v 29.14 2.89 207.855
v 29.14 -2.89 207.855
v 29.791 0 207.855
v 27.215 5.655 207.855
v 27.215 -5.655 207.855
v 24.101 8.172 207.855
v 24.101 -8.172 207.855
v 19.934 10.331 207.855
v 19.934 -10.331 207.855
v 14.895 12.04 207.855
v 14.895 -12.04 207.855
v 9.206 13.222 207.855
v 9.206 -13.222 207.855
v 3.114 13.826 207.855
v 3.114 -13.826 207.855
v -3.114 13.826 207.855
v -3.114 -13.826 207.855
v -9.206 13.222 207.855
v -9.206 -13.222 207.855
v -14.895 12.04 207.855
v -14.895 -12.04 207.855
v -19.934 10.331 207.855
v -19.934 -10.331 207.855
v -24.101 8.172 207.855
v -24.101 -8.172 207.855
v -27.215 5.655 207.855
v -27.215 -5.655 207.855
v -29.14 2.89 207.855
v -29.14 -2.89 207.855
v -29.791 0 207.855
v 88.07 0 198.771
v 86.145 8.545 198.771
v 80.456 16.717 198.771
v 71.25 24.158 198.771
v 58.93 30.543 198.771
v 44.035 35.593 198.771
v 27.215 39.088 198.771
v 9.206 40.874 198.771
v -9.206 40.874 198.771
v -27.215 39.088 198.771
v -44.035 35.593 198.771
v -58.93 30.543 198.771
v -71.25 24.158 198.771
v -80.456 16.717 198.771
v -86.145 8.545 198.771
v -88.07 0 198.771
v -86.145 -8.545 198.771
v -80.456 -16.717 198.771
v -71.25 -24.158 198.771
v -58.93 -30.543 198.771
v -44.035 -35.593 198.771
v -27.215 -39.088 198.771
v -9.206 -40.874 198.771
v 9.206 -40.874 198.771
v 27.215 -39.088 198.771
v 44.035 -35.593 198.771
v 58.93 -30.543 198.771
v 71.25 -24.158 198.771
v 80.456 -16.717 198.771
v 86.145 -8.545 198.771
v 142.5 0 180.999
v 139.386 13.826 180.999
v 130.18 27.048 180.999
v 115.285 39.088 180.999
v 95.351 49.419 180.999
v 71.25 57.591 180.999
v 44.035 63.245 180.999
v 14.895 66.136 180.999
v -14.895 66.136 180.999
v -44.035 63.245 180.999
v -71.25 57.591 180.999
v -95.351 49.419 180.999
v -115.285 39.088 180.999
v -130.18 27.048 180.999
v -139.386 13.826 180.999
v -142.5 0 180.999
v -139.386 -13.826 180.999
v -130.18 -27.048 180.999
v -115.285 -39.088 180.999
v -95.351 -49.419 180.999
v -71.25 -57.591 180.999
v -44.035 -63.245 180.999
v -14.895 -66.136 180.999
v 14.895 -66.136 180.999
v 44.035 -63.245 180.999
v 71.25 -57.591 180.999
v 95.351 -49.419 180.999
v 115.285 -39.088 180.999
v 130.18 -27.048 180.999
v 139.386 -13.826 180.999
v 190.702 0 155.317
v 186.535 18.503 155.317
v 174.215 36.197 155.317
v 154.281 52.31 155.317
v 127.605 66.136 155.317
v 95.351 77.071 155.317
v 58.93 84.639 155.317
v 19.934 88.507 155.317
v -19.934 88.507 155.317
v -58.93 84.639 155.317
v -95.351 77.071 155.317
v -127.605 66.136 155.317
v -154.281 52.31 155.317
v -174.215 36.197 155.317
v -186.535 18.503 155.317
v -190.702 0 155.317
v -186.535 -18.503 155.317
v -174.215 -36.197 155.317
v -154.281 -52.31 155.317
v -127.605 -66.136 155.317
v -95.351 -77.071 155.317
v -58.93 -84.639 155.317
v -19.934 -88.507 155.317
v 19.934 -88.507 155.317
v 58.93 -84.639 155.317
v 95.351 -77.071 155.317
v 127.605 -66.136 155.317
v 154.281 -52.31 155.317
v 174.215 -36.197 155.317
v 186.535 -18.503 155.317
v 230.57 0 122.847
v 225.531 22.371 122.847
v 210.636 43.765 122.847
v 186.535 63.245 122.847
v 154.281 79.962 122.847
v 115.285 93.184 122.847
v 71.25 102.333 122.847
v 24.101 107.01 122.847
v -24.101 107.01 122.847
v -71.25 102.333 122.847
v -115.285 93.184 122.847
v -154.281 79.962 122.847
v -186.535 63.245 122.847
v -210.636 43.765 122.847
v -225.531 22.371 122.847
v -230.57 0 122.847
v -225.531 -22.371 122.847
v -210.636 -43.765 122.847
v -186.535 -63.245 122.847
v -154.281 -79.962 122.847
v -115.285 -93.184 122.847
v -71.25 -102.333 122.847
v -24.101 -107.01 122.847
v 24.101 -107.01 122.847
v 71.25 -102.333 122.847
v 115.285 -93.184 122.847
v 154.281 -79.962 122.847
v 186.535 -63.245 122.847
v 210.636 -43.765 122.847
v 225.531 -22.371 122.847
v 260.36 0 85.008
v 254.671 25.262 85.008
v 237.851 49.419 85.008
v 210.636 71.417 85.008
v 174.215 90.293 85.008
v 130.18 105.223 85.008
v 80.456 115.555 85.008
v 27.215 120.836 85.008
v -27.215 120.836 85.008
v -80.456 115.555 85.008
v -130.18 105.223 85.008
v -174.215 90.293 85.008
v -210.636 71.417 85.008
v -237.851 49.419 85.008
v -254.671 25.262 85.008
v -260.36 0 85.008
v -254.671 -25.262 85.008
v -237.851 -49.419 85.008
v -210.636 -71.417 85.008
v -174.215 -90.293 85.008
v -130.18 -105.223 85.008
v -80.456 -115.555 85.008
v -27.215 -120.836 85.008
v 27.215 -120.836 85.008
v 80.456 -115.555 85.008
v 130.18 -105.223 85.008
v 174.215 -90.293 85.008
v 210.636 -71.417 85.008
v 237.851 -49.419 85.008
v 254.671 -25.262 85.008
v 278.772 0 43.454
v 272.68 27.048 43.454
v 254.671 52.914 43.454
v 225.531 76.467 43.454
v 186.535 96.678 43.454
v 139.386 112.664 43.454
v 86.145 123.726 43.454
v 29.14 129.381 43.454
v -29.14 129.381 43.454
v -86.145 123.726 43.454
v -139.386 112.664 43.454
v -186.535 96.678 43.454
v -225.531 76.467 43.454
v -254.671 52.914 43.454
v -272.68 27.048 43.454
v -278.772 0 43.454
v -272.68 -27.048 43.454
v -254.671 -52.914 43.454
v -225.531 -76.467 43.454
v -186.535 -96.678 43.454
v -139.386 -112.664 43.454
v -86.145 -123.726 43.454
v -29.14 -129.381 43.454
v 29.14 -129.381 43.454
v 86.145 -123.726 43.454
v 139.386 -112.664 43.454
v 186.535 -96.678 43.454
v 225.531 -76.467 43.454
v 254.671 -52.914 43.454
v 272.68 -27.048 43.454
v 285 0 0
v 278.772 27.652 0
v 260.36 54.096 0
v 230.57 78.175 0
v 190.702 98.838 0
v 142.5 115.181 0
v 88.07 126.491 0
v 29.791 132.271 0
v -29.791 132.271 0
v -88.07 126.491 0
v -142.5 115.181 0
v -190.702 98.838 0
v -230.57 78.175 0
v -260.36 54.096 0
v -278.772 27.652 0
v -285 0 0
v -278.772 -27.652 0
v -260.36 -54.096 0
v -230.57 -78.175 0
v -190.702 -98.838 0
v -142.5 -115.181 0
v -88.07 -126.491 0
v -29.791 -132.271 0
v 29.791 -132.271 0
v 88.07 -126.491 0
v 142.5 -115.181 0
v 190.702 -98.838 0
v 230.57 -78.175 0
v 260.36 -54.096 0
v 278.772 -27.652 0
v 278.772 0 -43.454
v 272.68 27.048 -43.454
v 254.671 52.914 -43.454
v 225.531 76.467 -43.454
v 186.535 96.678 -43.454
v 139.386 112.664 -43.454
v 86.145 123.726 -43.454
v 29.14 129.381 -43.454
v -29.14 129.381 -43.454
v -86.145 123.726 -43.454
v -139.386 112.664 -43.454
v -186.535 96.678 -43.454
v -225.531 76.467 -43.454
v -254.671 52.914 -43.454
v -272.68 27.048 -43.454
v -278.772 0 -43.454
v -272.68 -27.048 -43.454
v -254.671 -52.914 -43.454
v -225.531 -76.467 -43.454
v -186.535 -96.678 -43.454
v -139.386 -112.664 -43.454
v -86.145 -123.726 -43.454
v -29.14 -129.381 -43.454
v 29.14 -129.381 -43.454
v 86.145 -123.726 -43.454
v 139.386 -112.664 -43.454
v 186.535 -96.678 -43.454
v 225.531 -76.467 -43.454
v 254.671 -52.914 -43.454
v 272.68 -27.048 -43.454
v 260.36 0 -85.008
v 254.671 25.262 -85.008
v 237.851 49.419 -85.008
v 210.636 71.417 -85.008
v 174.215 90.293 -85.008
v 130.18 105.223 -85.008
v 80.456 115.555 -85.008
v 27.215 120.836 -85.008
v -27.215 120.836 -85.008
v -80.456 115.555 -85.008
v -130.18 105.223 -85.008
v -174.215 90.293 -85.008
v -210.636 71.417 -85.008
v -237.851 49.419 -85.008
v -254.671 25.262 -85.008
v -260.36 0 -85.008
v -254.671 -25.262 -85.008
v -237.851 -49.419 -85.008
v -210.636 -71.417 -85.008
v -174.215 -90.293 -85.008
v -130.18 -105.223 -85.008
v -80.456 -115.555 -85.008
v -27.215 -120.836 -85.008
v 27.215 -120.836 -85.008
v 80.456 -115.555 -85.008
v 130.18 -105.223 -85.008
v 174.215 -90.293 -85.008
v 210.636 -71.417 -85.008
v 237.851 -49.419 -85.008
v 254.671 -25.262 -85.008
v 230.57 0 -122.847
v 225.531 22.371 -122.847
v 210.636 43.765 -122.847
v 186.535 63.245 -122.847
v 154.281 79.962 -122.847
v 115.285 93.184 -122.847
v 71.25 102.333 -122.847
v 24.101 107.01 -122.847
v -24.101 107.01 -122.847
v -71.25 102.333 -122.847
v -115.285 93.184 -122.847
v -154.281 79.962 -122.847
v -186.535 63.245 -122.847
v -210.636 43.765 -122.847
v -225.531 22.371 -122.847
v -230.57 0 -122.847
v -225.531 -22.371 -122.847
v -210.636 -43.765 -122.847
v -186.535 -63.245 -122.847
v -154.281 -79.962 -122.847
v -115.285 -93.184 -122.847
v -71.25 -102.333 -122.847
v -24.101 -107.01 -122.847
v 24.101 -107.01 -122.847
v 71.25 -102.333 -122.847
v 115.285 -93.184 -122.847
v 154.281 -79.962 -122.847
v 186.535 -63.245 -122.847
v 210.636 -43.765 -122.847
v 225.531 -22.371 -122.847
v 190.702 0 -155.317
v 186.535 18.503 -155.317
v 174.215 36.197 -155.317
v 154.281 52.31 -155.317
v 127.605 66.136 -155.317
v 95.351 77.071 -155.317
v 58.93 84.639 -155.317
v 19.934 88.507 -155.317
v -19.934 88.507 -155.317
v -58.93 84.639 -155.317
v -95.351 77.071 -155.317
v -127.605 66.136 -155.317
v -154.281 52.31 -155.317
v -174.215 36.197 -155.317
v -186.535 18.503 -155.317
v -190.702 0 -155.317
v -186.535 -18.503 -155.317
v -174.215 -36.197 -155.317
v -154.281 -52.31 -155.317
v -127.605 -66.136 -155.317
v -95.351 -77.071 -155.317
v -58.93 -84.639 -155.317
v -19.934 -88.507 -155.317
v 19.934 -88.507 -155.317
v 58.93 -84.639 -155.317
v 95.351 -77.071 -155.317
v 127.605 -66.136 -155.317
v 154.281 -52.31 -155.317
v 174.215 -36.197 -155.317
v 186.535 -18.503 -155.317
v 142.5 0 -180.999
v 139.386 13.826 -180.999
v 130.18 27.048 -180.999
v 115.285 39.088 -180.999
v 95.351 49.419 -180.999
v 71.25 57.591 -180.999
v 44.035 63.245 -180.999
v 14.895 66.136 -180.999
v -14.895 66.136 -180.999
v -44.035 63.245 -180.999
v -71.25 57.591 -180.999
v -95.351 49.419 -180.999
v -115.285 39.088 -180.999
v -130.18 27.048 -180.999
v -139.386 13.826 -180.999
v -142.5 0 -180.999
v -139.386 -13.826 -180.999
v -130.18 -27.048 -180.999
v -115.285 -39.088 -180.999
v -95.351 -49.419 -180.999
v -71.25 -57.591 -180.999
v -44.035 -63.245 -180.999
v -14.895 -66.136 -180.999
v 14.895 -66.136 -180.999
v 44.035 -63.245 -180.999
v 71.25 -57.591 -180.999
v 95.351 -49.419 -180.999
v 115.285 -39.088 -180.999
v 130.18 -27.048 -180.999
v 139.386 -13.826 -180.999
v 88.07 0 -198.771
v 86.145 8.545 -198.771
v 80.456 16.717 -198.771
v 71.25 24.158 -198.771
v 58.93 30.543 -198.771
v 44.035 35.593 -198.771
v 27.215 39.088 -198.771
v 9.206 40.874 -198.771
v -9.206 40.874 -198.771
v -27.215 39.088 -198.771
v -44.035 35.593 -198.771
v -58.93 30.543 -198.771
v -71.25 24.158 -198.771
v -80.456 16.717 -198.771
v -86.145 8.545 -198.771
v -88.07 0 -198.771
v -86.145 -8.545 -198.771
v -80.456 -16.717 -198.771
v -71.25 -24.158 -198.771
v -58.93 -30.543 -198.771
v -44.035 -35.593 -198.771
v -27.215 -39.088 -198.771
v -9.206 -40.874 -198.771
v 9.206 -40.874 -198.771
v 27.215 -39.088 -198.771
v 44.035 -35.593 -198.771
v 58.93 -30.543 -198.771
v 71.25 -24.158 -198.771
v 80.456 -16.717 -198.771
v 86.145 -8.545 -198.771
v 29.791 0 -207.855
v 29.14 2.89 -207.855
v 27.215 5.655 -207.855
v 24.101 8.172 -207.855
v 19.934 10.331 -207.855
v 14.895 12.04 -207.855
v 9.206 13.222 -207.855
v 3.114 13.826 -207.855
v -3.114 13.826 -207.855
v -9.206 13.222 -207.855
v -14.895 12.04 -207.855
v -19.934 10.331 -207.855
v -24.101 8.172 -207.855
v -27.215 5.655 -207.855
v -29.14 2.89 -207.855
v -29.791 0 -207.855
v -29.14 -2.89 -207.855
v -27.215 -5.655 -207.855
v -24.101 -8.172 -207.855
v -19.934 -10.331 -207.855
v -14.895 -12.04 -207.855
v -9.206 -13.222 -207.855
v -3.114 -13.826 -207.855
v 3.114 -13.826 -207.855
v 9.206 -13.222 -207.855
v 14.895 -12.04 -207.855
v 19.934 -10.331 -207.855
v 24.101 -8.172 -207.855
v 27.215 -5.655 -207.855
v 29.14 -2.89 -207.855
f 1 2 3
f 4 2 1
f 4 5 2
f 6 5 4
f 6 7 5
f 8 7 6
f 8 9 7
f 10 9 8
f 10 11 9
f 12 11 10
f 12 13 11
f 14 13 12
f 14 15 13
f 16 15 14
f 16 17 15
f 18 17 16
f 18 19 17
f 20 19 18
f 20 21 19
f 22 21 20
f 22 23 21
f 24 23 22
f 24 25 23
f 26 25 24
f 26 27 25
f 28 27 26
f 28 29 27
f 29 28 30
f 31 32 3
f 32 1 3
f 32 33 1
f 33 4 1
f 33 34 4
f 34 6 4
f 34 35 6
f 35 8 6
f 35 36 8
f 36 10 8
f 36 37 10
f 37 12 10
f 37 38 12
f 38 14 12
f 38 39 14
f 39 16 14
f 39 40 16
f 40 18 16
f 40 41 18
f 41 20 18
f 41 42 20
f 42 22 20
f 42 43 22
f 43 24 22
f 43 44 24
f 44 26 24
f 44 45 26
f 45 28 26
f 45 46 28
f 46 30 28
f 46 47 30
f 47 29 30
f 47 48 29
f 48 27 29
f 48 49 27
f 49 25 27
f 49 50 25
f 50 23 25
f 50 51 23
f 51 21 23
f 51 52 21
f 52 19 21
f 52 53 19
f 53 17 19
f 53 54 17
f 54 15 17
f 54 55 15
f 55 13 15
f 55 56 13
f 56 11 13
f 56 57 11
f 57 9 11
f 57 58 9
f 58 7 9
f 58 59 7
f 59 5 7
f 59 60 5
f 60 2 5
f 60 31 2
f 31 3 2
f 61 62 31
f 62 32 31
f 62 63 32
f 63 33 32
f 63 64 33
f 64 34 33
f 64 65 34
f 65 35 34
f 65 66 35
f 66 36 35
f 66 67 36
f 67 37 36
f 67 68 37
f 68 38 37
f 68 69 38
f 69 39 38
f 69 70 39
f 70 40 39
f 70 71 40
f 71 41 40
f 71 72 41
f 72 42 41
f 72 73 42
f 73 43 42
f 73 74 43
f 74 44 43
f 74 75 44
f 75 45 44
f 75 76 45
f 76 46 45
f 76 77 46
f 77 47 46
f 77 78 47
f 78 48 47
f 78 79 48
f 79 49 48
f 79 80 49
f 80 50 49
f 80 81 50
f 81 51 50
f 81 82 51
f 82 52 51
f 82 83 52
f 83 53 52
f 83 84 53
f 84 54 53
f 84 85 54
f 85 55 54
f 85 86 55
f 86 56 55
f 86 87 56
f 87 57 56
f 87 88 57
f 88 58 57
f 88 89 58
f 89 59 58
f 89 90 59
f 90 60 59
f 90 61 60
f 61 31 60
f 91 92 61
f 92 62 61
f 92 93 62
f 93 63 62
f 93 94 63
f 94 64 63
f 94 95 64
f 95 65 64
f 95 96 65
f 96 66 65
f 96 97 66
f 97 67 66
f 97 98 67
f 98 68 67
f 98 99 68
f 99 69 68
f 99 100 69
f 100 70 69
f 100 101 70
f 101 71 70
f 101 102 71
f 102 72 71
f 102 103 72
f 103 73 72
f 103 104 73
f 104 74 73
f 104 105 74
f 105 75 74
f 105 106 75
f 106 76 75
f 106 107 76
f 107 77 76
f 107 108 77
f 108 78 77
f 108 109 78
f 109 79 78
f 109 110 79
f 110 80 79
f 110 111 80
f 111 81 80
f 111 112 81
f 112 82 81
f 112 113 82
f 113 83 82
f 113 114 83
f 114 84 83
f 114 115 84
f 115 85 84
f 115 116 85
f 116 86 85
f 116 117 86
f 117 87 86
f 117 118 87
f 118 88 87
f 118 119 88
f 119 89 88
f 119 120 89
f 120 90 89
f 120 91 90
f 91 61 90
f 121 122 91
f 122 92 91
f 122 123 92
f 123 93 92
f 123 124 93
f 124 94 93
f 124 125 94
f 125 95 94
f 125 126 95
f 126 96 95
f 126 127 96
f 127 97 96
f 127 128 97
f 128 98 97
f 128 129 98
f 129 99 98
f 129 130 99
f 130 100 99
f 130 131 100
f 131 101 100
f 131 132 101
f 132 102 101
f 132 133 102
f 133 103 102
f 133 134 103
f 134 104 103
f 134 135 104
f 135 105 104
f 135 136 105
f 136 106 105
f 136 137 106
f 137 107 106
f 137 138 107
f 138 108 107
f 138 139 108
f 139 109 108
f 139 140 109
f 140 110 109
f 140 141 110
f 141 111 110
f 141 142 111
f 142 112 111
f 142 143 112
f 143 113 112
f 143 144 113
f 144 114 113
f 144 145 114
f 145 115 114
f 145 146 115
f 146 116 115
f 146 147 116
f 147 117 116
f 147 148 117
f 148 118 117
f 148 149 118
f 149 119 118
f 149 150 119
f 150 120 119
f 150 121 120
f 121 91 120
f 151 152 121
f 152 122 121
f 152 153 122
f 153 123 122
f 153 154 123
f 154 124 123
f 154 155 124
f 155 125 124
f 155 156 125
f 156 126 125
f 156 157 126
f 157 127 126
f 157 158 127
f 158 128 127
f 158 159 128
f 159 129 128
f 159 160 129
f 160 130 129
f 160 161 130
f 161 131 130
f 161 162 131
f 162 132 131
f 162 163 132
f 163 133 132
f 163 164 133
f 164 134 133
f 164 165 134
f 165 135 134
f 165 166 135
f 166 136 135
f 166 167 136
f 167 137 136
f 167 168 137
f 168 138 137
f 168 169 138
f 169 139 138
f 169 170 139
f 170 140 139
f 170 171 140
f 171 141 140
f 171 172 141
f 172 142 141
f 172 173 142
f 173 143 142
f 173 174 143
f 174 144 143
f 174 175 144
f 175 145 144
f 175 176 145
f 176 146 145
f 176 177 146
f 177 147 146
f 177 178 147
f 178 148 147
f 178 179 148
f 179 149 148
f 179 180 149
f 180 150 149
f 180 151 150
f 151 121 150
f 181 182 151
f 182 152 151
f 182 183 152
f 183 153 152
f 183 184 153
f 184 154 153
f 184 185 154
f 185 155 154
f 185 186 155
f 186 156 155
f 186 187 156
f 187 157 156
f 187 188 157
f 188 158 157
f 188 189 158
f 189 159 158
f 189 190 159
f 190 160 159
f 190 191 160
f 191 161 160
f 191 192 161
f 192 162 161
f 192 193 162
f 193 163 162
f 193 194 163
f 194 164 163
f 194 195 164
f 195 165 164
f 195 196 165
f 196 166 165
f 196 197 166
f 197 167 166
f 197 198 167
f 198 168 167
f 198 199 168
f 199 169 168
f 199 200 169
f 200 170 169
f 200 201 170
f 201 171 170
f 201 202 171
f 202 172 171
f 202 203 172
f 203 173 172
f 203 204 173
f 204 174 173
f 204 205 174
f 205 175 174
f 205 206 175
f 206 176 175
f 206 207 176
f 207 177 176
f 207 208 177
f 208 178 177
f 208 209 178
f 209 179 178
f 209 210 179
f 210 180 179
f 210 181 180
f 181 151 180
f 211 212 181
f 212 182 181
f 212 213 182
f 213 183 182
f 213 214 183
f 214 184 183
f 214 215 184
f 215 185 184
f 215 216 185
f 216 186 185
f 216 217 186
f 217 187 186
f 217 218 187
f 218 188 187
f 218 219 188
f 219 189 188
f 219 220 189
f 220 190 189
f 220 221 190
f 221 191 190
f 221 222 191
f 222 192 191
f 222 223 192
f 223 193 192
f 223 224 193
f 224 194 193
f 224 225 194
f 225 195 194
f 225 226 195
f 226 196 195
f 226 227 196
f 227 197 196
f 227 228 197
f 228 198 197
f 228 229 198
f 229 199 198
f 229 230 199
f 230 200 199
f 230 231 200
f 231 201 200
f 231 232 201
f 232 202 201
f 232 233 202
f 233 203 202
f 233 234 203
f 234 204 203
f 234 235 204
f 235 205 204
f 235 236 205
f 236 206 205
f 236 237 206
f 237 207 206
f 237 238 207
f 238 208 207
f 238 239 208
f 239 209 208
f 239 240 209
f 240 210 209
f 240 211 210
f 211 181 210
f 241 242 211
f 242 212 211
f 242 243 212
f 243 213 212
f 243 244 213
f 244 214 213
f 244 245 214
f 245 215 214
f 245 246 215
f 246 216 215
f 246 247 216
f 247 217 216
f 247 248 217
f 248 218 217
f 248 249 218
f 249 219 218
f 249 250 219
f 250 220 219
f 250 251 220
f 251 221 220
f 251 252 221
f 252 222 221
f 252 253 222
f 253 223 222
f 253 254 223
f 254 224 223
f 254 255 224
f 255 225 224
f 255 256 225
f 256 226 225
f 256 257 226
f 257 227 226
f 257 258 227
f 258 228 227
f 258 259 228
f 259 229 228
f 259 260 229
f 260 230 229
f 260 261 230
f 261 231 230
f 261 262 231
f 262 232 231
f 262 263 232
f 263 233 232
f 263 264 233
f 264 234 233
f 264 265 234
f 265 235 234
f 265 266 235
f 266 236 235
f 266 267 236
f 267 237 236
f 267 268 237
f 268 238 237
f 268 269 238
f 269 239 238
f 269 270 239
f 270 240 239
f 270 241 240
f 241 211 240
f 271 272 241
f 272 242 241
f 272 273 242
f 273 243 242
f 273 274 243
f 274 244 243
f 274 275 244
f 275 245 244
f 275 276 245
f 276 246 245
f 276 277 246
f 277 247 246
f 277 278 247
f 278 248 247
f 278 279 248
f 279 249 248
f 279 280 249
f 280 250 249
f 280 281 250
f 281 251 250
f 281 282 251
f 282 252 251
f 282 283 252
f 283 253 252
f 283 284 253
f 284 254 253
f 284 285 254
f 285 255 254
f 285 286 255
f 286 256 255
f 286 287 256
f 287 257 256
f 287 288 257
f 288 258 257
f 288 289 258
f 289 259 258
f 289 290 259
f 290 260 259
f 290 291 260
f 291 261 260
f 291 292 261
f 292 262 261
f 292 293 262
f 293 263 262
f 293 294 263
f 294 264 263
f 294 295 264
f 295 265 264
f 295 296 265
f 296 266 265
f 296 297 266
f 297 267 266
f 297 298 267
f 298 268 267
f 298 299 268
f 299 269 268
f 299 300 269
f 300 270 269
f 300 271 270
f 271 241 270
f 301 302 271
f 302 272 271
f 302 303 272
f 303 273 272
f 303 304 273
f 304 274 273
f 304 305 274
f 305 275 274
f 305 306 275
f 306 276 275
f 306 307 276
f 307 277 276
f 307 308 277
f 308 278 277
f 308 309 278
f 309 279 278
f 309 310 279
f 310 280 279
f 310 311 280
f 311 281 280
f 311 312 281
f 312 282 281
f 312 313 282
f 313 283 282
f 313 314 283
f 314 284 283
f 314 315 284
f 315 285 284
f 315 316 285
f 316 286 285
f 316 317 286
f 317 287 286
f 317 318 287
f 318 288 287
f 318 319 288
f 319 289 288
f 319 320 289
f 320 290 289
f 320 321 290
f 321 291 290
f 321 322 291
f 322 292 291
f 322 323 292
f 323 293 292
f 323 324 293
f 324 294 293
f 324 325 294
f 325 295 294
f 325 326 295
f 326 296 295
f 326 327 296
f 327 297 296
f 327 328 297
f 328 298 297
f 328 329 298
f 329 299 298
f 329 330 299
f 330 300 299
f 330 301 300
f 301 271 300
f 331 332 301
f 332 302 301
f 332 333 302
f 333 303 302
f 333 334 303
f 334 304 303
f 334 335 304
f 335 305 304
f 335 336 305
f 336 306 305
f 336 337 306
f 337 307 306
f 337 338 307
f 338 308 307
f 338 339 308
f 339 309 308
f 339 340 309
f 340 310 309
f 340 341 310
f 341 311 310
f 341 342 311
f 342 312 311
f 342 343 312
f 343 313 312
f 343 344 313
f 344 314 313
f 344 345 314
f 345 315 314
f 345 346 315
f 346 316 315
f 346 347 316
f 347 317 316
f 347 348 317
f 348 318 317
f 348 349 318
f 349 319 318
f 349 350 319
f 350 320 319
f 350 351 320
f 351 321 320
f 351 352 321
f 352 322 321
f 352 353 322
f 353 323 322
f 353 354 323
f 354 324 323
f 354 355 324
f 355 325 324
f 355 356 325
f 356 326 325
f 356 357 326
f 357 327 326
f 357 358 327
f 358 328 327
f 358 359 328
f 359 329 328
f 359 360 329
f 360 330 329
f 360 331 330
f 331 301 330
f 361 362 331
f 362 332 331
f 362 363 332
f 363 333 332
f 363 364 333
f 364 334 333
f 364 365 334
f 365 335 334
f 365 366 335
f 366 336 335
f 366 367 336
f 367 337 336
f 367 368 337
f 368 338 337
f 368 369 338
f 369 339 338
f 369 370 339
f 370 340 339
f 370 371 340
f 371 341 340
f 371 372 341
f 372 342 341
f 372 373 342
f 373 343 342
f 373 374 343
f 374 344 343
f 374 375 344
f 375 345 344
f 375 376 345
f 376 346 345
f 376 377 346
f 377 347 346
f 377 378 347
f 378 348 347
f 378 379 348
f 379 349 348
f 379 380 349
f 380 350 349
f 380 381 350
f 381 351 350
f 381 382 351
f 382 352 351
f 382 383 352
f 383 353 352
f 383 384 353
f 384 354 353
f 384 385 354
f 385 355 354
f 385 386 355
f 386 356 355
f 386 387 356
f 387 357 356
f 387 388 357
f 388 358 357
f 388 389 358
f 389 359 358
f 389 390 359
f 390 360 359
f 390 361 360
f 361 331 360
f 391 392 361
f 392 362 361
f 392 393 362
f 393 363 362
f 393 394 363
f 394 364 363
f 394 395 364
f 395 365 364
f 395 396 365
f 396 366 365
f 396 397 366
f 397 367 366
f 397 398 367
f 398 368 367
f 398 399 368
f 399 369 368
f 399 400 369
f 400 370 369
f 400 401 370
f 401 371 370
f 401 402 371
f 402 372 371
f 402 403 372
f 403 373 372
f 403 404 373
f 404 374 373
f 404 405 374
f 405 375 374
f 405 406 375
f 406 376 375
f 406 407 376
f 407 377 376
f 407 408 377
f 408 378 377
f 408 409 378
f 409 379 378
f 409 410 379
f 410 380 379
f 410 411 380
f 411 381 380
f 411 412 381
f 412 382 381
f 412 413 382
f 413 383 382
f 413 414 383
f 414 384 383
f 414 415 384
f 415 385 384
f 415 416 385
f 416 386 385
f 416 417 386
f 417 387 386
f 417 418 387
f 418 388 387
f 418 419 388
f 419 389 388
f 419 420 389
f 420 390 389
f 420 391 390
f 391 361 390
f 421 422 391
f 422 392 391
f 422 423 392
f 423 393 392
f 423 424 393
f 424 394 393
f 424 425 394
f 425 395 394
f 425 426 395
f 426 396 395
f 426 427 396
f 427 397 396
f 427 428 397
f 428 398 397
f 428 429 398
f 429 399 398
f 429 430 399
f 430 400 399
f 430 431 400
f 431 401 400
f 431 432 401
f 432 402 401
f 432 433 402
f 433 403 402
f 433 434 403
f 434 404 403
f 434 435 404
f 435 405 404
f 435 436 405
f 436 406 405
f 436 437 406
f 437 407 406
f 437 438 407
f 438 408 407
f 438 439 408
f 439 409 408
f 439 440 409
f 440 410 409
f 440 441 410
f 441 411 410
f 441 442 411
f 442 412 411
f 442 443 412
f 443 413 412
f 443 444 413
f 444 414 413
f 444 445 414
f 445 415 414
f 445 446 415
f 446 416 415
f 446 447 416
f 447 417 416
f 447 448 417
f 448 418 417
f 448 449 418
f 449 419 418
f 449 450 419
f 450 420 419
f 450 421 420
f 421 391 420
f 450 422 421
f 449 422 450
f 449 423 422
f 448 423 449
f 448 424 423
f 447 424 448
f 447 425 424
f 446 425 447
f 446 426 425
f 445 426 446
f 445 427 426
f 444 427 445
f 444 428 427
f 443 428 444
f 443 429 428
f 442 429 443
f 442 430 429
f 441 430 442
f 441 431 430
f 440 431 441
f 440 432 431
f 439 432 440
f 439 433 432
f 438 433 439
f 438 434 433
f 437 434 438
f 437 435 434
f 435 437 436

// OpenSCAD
// Generated by SolidPython 1.0.1 on 2020-07-29 00:46:51


scale(v = [15, 7, 11]) {
	sphere(r = 19);
}
/***********************************************
*********      SolidPython code:      **********
************************************************
 
# import packages: SolidPython
from solid import *
from solid.utils import *
from itertools import chain, combinations, permutations


class Resize:

    def __init__(self, scad_file):
        self.scad_file = scad_file
        #self.scad_file = import_scad(scad_file)
        # cone/cylinder param:
        self.r1 = 0
        self.r2 = 0
        self.h = 0
        # rectangular prism param:
        self.w = 0
        self.l = 0
        # ellipse param:
        self.r = 0

    # import OpenScad code (file name corresponds to shape)


    # classify shape + parameters
    def assign(self, param1, param2, param3):
        if self.scad_file == 'cone.scad':
            self.r1 = param1
            self.r2 = param2
            self.h = param3
        elif self.scad_file == 'cylinder.scad':
            self.r1 = param1
            self.r2 = param2
            self.h = param3
        elif self.scad_file == 'rectangularPrism.scad':
            self.h = param1
            self.l = param2
            self.w = param3
        else:
            self.r = param1
            self.h = param2

    # resize parameters
    def iterate(self):
        x = range(3, 20, 2)
        i = 1
        if self.scad_file == 'cone.scad':
            tempList = list(permutations(x, 2))
            for temp in tempList:
                param1 = temp[0]
                param2 = temp[1]
                filepath = 'produced_scad_files/' + 'cone' + str(param1) + '_' + str(param2) + '_' + '.scad'
                scad_render_to_file(cylinder(h=param1, r1=param2, r2=0), filepath)

        elif self.scad_file == 'cylinder.scad':
            tempList = list(permutations(x, 3))
            for temp in tempList:
                param1 = temp[0]
                param2 = temp[1]
                filepath = 'produced_scad_files/' + 'cylinder' + str(param1) + '_' + str(param2) + '_' + '.scad'
                scad_render_to_file(cylinder(h=param1, r1=param2, r2=param2), filepath)

        elif self.scad_file == 'rectangularPrism.scad':
            tempList = list(permutations(x, 3))
            for temp in tempList:
                param1 = temp[0]
                param2 = temp[1]
                param3 = temp[2]
                filepath = 'produced_scad_files/' + 'rectangularPrism' + str(param1) + '_' + str(param2) + '_' + str(
                    param3) + '.scad'
                scad_render_to_file(cube(size=(param1, param2, param3)), filepath)

        elif self.scad_file == 'ellipse.scad':
            tempList = list(permutations(x, 4))
            for temp in tempList:
                param1 = temp[0]
                param2 = temp[1]
                param3 = temp[2]
                param4 = temp[3]
                filepath = 'produced_scad_files/' + 'ellipse' + str(param1) + '_' + str(param2) + '_' + str(param3) + '_' + str(param4) + '.scad'
                scad_render_to_file(scale([param1, param2, param3])(sphere(r=param4)), filepath)

    def render_to_scadfile(self):
        scad_render_to_file(scad, 'example.scad') 
 
************************************************/
